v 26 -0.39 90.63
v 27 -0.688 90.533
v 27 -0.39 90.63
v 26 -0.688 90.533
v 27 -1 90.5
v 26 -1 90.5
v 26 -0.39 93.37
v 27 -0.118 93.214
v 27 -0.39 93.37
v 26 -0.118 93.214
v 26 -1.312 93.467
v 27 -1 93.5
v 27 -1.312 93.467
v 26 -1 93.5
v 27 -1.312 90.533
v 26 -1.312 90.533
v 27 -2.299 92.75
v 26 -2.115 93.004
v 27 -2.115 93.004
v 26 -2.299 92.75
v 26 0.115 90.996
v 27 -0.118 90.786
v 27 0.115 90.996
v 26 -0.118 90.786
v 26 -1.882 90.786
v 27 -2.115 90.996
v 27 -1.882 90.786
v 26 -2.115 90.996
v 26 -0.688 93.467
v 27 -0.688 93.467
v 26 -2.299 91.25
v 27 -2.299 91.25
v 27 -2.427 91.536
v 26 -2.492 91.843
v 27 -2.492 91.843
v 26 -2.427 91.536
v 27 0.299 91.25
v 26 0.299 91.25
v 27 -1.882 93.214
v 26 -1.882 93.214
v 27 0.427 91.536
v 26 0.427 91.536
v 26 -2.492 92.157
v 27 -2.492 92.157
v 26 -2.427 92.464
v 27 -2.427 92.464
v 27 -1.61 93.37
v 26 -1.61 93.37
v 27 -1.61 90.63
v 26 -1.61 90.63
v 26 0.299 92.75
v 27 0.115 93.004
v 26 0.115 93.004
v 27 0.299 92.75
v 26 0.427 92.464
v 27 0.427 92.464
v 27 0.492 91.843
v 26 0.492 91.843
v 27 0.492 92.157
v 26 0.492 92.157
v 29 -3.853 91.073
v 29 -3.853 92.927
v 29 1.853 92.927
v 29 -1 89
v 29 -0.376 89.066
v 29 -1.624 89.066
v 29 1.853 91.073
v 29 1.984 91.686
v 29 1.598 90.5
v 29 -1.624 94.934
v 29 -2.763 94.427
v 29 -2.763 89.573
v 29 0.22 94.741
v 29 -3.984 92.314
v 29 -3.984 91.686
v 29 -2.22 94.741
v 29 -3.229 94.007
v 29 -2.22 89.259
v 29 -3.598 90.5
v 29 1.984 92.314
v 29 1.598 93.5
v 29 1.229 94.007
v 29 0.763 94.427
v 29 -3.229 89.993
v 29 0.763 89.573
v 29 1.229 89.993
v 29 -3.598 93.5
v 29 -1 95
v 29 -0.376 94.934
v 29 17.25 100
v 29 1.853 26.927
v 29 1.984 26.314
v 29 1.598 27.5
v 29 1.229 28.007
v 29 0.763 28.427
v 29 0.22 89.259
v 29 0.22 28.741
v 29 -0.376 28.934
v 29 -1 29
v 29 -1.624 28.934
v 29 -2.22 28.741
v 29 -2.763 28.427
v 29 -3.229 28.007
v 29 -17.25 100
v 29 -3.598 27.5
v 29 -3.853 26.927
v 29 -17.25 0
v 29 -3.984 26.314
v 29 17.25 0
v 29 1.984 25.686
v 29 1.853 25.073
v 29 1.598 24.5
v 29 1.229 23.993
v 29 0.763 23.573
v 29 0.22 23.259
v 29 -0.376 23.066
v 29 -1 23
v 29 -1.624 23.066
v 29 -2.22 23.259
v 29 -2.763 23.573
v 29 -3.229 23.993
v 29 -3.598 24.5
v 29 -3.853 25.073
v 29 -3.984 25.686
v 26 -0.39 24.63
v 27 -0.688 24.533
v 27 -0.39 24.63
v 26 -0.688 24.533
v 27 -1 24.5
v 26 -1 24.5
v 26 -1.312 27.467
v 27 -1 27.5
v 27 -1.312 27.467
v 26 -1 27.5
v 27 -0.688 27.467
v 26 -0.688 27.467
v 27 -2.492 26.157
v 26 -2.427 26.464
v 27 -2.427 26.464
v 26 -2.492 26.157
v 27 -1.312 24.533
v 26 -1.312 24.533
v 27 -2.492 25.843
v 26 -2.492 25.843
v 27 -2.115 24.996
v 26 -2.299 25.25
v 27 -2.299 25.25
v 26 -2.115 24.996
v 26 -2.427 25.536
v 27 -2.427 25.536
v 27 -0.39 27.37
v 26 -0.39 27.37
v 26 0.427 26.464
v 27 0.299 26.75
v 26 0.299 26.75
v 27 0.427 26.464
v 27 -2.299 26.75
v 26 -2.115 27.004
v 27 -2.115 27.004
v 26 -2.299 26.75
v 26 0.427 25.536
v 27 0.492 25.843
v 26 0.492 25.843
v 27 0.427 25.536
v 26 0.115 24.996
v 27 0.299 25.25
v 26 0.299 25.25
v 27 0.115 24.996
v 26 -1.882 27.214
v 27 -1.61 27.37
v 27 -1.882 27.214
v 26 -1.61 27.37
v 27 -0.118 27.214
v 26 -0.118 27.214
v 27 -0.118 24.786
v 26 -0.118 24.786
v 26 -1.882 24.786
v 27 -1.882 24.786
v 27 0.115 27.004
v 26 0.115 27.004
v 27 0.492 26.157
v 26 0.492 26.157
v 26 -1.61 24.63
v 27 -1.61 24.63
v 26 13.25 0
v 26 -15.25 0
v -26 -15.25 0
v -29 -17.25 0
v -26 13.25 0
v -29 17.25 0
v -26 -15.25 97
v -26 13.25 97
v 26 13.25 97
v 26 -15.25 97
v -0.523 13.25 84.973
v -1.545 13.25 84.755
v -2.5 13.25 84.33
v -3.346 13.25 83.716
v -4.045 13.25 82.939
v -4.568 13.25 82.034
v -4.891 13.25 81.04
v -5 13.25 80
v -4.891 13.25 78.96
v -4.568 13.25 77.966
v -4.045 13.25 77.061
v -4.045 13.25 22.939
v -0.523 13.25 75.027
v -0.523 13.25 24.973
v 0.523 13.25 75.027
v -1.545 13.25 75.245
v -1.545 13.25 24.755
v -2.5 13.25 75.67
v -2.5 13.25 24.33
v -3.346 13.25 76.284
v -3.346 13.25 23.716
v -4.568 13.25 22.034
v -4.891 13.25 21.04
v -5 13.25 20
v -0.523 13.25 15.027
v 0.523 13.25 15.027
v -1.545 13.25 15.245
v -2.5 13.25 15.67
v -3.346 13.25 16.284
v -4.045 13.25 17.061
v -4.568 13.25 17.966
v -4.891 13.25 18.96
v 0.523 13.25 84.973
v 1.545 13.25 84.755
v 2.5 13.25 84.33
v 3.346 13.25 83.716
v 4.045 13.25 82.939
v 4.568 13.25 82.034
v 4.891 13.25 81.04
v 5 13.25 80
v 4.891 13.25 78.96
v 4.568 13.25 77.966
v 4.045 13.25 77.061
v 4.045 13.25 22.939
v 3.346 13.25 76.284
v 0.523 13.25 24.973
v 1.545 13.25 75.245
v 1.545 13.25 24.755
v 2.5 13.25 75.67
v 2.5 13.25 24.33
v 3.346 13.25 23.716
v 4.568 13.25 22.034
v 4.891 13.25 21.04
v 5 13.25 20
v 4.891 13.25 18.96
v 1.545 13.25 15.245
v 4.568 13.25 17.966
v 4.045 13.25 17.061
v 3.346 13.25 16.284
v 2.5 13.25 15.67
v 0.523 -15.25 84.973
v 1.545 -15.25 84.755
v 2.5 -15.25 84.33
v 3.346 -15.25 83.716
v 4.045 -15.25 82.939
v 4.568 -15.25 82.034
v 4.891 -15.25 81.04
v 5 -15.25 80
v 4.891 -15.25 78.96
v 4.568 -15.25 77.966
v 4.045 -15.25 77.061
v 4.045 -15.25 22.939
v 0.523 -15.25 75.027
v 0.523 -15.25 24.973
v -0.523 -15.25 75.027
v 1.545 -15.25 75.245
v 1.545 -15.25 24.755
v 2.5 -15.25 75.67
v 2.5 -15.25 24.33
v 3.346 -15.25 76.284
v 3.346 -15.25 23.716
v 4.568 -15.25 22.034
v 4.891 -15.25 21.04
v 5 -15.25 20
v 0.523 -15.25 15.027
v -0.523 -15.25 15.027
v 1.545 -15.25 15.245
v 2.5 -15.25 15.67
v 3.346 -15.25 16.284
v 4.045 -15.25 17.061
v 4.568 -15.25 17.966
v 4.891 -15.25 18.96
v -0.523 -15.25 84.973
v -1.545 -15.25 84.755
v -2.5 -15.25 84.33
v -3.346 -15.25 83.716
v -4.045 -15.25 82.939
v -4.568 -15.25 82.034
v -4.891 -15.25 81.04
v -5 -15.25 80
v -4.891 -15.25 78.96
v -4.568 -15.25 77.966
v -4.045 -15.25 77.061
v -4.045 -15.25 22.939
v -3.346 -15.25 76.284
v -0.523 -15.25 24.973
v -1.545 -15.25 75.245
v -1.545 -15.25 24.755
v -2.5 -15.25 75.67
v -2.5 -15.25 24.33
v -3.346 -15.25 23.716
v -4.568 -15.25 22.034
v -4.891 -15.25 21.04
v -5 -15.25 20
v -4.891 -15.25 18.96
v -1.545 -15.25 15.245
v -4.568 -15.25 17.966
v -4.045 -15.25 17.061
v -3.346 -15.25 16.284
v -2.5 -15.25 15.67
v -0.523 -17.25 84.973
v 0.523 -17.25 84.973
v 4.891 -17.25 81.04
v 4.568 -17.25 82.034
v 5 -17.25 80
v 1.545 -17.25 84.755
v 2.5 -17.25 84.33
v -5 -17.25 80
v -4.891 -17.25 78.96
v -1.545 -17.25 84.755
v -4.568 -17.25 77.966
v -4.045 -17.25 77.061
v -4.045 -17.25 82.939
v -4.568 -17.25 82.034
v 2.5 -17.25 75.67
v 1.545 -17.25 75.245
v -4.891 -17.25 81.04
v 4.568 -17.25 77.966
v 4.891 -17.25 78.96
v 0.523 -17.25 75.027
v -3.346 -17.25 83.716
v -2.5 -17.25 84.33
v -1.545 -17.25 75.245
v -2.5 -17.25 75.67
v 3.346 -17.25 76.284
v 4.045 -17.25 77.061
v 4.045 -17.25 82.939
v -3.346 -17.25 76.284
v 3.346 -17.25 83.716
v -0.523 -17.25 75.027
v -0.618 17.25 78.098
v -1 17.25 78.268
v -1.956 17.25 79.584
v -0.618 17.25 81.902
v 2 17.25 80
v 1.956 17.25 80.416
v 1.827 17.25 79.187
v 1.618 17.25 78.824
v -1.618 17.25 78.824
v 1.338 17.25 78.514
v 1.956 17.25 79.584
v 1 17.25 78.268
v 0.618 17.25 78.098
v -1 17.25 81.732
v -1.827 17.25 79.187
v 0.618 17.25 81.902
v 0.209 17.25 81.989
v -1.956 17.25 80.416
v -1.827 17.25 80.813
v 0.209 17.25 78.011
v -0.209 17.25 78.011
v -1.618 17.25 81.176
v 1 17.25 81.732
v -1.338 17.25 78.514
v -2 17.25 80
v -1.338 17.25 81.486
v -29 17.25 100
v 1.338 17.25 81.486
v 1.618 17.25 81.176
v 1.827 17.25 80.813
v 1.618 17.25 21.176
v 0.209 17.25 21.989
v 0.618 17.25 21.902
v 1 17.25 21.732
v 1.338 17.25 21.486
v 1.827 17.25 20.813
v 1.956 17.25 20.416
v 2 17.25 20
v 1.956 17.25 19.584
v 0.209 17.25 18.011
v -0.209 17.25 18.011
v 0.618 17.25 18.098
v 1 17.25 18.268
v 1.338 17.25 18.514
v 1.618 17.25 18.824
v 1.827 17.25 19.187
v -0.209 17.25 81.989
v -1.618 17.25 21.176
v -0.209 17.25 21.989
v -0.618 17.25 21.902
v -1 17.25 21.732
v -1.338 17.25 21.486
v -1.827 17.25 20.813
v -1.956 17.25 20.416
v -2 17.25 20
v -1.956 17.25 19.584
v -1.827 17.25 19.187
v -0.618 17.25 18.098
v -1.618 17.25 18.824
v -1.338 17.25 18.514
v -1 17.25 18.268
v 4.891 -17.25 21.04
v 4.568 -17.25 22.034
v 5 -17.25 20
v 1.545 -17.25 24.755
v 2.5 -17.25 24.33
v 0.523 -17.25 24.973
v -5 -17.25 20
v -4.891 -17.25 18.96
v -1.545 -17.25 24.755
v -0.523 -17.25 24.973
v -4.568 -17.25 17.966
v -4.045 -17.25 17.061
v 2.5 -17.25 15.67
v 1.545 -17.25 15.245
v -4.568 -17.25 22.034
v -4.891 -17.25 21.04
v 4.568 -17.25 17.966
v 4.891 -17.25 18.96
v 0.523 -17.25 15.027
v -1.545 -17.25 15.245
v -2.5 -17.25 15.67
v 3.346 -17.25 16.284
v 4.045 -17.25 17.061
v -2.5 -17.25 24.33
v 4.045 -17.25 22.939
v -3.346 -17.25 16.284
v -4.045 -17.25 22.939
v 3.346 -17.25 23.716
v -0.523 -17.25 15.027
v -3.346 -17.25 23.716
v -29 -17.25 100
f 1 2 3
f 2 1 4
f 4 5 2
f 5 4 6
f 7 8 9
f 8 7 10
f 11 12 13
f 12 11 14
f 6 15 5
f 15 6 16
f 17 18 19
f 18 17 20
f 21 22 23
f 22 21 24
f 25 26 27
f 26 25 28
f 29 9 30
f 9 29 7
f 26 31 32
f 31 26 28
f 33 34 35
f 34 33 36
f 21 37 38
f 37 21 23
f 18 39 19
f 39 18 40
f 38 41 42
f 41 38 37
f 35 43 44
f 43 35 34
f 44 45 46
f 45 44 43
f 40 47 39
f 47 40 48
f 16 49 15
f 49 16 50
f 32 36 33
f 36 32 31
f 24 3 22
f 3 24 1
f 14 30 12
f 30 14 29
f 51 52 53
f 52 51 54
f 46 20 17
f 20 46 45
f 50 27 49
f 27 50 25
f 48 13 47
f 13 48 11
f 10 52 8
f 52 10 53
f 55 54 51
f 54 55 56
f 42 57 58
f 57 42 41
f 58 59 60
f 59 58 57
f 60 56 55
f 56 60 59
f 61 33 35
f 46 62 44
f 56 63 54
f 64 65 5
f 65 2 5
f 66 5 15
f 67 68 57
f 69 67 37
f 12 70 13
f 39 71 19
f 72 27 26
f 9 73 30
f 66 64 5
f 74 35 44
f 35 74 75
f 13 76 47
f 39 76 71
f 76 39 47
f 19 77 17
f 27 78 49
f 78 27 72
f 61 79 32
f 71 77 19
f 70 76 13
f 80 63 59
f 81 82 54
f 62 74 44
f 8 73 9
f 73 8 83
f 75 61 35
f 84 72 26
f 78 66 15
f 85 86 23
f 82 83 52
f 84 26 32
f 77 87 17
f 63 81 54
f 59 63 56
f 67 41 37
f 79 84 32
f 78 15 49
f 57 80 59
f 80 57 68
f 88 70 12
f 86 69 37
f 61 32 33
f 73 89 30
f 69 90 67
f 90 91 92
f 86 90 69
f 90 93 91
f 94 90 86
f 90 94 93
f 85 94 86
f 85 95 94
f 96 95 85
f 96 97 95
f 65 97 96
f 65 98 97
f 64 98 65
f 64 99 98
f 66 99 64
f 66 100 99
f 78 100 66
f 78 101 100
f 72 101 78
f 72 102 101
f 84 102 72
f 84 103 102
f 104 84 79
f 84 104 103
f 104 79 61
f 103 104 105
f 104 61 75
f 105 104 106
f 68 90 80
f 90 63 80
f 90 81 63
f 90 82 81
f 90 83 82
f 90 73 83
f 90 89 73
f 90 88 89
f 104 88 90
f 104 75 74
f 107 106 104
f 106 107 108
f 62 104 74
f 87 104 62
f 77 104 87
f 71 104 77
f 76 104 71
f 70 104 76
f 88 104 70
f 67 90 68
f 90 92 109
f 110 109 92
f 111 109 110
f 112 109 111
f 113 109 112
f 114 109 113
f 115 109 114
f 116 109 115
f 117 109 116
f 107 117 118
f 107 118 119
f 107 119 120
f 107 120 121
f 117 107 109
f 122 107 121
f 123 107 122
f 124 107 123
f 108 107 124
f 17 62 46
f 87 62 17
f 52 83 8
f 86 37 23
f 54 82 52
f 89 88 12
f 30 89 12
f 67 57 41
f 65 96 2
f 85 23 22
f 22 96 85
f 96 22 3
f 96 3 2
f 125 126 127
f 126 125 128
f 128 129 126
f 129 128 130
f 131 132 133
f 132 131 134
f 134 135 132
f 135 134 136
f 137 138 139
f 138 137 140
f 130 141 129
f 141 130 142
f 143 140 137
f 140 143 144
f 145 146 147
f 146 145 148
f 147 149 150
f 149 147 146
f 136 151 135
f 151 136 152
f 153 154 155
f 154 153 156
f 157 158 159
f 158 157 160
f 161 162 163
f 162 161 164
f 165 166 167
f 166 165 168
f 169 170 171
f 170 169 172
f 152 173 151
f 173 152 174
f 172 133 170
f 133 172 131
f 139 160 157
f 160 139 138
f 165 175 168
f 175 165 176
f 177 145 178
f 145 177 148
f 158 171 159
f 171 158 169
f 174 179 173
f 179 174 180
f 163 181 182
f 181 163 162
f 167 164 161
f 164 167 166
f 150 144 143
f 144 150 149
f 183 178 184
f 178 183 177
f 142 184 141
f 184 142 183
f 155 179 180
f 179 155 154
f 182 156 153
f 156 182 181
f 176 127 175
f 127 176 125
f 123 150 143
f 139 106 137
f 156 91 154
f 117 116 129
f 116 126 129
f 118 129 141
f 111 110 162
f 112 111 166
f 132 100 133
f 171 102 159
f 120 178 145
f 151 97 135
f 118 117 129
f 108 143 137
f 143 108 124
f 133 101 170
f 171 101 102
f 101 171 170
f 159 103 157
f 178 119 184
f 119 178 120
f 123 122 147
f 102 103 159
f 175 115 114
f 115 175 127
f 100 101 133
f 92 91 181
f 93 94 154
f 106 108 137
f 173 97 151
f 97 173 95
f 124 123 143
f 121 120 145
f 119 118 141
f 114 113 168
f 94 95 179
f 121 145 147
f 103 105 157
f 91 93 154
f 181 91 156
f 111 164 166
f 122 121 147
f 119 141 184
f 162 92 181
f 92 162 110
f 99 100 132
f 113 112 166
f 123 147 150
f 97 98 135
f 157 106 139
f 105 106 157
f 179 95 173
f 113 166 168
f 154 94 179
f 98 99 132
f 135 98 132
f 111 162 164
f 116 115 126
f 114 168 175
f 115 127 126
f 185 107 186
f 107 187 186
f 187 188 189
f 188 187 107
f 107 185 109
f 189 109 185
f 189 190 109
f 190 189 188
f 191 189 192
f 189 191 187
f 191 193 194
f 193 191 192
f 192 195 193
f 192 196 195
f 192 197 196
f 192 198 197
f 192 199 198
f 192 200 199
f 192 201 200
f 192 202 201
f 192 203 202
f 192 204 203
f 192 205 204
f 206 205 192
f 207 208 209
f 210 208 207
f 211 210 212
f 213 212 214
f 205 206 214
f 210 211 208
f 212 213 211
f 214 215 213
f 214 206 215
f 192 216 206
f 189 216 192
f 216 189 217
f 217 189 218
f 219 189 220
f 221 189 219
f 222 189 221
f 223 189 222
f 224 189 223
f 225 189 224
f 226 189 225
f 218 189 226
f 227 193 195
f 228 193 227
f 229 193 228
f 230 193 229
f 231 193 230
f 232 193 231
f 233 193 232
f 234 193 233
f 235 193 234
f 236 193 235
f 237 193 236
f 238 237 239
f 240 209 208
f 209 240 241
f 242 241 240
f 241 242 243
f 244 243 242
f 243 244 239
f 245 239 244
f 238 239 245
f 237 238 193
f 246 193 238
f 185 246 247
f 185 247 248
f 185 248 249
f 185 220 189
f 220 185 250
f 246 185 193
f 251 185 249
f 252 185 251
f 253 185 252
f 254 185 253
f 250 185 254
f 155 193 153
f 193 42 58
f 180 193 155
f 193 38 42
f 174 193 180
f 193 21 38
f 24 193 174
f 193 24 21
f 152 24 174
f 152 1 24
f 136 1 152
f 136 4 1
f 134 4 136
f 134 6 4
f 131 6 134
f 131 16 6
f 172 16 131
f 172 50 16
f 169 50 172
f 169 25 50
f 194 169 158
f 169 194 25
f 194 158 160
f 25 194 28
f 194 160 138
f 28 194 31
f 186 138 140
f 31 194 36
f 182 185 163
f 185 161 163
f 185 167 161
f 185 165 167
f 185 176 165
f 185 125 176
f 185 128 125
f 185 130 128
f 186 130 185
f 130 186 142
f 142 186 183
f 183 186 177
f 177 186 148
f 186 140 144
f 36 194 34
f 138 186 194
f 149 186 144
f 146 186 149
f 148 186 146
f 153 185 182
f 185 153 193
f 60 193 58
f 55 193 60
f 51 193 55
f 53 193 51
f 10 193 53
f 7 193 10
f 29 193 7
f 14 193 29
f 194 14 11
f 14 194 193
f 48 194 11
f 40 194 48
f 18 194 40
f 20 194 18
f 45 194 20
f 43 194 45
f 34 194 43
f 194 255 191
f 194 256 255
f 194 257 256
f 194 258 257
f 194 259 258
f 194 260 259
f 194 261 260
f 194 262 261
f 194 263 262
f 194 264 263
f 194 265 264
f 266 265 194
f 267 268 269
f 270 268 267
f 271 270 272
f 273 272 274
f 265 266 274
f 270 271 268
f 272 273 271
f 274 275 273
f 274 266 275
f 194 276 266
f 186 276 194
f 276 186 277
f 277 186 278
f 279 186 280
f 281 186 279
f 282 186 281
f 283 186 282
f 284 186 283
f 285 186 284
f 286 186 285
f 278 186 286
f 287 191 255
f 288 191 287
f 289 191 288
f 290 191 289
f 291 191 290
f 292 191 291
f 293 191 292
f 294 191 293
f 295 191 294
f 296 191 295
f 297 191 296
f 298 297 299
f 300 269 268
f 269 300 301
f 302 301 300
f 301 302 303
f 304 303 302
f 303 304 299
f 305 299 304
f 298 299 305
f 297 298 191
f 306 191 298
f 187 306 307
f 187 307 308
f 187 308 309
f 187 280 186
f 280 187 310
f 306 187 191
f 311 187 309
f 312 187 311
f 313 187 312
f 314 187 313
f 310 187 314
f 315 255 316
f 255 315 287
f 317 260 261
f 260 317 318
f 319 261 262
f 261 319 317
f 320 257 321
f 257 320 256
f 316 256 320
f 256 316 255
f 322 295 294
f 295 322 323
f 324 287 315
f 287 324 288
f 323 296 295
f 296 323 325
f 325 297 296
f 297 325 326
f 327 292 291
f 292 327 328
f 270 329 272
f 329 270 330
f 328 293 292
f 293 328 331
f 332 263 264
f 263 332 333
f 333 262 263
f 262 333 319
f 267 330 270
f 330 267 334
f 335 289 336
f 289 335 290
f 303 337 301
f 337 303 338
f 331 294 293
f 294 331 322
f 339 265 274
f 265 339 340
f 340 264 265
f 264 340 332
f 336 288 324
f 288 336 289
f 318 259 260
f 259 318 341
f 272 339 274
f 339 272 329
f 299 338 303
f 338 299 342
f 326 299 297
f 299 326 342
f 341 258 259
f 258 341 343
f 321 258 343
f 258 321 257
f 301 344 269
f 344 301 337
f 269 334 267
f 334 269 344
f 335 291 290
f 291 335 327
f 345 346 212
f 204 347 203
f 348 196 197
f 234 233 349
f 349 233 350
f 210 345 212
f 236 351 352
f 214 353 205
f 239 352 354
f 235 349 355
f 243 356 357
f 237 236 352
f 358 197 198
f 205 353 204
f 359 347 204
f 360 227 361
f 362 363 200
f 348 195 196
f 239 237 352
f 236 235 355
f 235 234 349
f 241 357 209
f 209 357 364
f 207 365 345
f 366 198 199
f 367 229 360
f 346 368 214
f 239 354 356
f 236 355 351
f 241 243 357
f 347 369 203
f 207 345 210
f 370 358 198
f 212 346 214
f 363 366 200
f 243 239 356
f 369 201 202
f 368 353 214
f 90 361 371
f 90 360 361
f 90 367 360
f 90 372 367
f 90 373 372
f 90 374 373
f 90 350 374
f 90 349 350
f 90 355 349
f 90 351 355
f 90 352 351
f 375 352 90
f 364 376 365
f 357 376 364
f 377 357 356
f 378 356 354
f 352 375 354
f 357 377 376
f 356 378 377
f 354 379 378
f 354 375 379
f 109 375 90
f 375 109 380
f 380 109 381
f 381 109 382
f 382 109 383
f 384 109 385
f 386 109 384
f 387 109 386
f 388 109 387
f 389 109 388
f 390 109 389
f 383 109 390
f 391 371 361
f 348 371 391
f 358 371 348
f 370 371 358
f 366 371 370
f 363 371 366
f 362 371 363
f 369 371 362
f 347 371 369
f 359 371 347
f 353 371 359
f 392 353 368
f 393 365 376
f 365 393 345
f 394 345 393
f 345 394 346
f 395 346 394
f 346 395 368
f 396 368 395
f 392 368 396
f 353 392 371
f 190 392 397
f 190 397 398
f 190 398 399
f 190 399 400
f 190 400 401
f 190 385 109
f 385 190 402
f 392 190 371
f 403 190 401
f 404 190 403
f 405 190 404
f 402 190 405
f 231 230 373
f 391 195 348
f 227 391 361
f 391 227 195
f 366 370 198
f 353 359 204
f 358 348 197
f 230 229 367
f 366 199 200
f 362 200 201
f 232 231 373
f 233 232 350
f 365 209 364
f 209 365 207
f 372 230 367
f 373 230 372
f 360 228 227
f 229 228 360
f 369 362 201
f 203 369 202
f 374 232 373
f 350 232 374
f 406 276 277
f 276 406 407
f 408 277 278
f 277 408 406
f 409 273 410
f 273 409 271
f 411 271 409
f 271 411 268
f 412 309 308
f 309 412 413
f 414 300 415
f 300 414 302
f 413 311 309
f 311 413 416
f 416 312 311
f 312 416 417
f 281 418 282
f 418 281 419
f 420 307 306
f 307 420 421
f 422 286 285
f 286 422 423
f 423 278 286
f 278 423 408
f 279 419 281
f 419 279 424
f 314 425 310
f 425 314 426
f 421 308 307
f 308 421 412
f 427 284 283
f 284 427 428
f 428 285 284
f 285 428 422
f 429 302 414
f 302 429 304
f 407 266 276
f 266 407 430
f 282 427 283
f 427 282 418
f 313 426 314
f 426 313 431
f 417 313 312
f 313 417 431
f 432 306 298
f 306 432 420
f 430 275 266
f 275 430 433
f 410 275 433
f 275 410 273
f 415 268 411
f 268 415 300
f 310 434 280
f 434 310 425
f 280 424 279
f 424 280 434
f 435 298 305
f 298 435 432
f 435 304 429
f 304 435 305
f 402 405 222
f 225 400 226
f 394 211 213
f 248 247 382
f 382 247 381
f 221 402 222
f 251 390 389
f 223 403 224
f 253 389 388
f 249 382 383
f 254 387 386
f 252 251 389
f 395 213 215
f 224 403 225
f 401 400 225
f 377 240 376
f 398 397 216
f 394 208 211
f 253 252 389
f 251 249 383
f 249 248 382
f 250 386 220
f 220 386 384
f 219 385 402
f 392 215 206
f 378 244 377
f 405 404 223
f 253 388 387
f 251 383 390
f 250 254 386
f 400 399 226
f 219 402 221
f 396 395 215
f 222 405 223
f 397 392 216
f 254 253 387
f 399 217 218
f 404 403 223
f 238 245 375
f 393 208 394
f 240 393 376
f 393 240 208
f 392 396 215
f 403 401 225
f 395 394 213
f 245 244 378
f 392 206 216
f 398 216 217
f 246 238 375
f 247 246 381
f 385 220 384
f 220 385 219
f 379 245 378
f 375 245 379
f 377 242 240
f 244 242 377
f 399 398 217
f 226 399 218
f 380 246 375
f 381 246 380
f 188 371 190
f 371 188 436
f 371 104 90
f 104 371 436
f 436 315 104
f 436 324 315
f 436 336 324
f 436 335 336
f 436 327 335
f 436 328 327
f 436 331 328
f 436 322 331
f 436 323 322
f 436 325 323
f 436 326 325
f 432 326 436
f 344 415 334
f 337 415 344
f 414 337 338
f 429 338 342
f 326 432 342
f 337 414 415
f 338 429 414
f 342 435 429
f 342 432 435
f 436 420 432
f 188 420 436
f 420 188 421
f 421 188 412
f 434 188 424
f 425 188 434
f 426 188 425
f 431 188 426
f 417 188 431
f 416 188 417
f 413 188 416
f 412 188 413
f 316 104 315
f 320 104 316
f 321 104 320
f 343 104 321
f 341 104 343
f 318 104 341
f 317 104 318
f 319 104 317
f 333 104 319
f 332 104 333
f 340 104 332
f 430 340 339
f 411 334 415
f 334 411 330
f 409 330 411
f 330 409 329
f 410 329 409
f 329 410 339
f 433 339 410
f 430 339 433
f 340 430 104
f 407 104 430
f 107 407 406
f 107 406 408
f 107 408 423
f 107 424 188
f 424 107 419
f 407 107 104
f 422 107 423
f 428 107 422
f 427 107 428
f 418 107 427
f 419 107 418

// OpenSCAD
wall = 3;



difference() {
    linear_extrude(100) square([52+2*wall, 28.5+2*wall], true);
    
    translate([0,-1]) {  
        linear_extrude(100-wall) square([52, 28.5], true);
        
        translate([0, 0, 100-wall-5]) {
            rotate([0,90,0]) linear_extrude(50) circle(d=3, $fn=30);
            #translate([(53+1)/2,0]) rotate([0,90,0]) cylinder(d1=3, d2=6, h=2, $fn=30);
        }

        translate([0, 0, 100-wall-5-66]) {
            rotate([0,90,0]) linear_extrude(50) circle(d=3, $fn=30);
            translate([(53+1)/2,0]) rotate([0,90,0]) cylinder(d1=3, d2=6, h=2, $fn=30);
        }
    }

    translate([0, 0, 100-20]) {
        rotate([90,0,0]) linear_extrude(30) circle(d=10, $fn=30);
        translate([0,28.5/2+wall]) rotate([90,0,0]) cylinder(d1=4, d2=10, h=4, $fn=30);
    }
    #translate([0, 0, 20]) {
        rotate([90,0,0]) linear_extrude(30) circle(d=10, $fn=30);
        translate([0,28.5/2+wall]) rotate([90,0,0]) cylinder(d1=4, d2=10, h=4, $fn=30);
    }

}

*difference() {
    linear_extrude(wall+110) polygon([
        [-70/2,0],
        [-70/2,wall],
        [-(52+2*wall)/2,wall],
        [-(52+2*wall)/2, 29+wall],
        [(52+2*wall)/2, 29+wall],
        [(52+2*wall)/2,wall],
        [70/2,wall],
        [70/2,0],
        [52/2, 0],
        [52/2, 29],
        [-52/2, 29],
        [-52/2, 0]
    ]);
    
    
    
    
}

*translate([-52/2-wall, 0]) linear_extrude(wall) square([52+2*wall, 29+wall]);
